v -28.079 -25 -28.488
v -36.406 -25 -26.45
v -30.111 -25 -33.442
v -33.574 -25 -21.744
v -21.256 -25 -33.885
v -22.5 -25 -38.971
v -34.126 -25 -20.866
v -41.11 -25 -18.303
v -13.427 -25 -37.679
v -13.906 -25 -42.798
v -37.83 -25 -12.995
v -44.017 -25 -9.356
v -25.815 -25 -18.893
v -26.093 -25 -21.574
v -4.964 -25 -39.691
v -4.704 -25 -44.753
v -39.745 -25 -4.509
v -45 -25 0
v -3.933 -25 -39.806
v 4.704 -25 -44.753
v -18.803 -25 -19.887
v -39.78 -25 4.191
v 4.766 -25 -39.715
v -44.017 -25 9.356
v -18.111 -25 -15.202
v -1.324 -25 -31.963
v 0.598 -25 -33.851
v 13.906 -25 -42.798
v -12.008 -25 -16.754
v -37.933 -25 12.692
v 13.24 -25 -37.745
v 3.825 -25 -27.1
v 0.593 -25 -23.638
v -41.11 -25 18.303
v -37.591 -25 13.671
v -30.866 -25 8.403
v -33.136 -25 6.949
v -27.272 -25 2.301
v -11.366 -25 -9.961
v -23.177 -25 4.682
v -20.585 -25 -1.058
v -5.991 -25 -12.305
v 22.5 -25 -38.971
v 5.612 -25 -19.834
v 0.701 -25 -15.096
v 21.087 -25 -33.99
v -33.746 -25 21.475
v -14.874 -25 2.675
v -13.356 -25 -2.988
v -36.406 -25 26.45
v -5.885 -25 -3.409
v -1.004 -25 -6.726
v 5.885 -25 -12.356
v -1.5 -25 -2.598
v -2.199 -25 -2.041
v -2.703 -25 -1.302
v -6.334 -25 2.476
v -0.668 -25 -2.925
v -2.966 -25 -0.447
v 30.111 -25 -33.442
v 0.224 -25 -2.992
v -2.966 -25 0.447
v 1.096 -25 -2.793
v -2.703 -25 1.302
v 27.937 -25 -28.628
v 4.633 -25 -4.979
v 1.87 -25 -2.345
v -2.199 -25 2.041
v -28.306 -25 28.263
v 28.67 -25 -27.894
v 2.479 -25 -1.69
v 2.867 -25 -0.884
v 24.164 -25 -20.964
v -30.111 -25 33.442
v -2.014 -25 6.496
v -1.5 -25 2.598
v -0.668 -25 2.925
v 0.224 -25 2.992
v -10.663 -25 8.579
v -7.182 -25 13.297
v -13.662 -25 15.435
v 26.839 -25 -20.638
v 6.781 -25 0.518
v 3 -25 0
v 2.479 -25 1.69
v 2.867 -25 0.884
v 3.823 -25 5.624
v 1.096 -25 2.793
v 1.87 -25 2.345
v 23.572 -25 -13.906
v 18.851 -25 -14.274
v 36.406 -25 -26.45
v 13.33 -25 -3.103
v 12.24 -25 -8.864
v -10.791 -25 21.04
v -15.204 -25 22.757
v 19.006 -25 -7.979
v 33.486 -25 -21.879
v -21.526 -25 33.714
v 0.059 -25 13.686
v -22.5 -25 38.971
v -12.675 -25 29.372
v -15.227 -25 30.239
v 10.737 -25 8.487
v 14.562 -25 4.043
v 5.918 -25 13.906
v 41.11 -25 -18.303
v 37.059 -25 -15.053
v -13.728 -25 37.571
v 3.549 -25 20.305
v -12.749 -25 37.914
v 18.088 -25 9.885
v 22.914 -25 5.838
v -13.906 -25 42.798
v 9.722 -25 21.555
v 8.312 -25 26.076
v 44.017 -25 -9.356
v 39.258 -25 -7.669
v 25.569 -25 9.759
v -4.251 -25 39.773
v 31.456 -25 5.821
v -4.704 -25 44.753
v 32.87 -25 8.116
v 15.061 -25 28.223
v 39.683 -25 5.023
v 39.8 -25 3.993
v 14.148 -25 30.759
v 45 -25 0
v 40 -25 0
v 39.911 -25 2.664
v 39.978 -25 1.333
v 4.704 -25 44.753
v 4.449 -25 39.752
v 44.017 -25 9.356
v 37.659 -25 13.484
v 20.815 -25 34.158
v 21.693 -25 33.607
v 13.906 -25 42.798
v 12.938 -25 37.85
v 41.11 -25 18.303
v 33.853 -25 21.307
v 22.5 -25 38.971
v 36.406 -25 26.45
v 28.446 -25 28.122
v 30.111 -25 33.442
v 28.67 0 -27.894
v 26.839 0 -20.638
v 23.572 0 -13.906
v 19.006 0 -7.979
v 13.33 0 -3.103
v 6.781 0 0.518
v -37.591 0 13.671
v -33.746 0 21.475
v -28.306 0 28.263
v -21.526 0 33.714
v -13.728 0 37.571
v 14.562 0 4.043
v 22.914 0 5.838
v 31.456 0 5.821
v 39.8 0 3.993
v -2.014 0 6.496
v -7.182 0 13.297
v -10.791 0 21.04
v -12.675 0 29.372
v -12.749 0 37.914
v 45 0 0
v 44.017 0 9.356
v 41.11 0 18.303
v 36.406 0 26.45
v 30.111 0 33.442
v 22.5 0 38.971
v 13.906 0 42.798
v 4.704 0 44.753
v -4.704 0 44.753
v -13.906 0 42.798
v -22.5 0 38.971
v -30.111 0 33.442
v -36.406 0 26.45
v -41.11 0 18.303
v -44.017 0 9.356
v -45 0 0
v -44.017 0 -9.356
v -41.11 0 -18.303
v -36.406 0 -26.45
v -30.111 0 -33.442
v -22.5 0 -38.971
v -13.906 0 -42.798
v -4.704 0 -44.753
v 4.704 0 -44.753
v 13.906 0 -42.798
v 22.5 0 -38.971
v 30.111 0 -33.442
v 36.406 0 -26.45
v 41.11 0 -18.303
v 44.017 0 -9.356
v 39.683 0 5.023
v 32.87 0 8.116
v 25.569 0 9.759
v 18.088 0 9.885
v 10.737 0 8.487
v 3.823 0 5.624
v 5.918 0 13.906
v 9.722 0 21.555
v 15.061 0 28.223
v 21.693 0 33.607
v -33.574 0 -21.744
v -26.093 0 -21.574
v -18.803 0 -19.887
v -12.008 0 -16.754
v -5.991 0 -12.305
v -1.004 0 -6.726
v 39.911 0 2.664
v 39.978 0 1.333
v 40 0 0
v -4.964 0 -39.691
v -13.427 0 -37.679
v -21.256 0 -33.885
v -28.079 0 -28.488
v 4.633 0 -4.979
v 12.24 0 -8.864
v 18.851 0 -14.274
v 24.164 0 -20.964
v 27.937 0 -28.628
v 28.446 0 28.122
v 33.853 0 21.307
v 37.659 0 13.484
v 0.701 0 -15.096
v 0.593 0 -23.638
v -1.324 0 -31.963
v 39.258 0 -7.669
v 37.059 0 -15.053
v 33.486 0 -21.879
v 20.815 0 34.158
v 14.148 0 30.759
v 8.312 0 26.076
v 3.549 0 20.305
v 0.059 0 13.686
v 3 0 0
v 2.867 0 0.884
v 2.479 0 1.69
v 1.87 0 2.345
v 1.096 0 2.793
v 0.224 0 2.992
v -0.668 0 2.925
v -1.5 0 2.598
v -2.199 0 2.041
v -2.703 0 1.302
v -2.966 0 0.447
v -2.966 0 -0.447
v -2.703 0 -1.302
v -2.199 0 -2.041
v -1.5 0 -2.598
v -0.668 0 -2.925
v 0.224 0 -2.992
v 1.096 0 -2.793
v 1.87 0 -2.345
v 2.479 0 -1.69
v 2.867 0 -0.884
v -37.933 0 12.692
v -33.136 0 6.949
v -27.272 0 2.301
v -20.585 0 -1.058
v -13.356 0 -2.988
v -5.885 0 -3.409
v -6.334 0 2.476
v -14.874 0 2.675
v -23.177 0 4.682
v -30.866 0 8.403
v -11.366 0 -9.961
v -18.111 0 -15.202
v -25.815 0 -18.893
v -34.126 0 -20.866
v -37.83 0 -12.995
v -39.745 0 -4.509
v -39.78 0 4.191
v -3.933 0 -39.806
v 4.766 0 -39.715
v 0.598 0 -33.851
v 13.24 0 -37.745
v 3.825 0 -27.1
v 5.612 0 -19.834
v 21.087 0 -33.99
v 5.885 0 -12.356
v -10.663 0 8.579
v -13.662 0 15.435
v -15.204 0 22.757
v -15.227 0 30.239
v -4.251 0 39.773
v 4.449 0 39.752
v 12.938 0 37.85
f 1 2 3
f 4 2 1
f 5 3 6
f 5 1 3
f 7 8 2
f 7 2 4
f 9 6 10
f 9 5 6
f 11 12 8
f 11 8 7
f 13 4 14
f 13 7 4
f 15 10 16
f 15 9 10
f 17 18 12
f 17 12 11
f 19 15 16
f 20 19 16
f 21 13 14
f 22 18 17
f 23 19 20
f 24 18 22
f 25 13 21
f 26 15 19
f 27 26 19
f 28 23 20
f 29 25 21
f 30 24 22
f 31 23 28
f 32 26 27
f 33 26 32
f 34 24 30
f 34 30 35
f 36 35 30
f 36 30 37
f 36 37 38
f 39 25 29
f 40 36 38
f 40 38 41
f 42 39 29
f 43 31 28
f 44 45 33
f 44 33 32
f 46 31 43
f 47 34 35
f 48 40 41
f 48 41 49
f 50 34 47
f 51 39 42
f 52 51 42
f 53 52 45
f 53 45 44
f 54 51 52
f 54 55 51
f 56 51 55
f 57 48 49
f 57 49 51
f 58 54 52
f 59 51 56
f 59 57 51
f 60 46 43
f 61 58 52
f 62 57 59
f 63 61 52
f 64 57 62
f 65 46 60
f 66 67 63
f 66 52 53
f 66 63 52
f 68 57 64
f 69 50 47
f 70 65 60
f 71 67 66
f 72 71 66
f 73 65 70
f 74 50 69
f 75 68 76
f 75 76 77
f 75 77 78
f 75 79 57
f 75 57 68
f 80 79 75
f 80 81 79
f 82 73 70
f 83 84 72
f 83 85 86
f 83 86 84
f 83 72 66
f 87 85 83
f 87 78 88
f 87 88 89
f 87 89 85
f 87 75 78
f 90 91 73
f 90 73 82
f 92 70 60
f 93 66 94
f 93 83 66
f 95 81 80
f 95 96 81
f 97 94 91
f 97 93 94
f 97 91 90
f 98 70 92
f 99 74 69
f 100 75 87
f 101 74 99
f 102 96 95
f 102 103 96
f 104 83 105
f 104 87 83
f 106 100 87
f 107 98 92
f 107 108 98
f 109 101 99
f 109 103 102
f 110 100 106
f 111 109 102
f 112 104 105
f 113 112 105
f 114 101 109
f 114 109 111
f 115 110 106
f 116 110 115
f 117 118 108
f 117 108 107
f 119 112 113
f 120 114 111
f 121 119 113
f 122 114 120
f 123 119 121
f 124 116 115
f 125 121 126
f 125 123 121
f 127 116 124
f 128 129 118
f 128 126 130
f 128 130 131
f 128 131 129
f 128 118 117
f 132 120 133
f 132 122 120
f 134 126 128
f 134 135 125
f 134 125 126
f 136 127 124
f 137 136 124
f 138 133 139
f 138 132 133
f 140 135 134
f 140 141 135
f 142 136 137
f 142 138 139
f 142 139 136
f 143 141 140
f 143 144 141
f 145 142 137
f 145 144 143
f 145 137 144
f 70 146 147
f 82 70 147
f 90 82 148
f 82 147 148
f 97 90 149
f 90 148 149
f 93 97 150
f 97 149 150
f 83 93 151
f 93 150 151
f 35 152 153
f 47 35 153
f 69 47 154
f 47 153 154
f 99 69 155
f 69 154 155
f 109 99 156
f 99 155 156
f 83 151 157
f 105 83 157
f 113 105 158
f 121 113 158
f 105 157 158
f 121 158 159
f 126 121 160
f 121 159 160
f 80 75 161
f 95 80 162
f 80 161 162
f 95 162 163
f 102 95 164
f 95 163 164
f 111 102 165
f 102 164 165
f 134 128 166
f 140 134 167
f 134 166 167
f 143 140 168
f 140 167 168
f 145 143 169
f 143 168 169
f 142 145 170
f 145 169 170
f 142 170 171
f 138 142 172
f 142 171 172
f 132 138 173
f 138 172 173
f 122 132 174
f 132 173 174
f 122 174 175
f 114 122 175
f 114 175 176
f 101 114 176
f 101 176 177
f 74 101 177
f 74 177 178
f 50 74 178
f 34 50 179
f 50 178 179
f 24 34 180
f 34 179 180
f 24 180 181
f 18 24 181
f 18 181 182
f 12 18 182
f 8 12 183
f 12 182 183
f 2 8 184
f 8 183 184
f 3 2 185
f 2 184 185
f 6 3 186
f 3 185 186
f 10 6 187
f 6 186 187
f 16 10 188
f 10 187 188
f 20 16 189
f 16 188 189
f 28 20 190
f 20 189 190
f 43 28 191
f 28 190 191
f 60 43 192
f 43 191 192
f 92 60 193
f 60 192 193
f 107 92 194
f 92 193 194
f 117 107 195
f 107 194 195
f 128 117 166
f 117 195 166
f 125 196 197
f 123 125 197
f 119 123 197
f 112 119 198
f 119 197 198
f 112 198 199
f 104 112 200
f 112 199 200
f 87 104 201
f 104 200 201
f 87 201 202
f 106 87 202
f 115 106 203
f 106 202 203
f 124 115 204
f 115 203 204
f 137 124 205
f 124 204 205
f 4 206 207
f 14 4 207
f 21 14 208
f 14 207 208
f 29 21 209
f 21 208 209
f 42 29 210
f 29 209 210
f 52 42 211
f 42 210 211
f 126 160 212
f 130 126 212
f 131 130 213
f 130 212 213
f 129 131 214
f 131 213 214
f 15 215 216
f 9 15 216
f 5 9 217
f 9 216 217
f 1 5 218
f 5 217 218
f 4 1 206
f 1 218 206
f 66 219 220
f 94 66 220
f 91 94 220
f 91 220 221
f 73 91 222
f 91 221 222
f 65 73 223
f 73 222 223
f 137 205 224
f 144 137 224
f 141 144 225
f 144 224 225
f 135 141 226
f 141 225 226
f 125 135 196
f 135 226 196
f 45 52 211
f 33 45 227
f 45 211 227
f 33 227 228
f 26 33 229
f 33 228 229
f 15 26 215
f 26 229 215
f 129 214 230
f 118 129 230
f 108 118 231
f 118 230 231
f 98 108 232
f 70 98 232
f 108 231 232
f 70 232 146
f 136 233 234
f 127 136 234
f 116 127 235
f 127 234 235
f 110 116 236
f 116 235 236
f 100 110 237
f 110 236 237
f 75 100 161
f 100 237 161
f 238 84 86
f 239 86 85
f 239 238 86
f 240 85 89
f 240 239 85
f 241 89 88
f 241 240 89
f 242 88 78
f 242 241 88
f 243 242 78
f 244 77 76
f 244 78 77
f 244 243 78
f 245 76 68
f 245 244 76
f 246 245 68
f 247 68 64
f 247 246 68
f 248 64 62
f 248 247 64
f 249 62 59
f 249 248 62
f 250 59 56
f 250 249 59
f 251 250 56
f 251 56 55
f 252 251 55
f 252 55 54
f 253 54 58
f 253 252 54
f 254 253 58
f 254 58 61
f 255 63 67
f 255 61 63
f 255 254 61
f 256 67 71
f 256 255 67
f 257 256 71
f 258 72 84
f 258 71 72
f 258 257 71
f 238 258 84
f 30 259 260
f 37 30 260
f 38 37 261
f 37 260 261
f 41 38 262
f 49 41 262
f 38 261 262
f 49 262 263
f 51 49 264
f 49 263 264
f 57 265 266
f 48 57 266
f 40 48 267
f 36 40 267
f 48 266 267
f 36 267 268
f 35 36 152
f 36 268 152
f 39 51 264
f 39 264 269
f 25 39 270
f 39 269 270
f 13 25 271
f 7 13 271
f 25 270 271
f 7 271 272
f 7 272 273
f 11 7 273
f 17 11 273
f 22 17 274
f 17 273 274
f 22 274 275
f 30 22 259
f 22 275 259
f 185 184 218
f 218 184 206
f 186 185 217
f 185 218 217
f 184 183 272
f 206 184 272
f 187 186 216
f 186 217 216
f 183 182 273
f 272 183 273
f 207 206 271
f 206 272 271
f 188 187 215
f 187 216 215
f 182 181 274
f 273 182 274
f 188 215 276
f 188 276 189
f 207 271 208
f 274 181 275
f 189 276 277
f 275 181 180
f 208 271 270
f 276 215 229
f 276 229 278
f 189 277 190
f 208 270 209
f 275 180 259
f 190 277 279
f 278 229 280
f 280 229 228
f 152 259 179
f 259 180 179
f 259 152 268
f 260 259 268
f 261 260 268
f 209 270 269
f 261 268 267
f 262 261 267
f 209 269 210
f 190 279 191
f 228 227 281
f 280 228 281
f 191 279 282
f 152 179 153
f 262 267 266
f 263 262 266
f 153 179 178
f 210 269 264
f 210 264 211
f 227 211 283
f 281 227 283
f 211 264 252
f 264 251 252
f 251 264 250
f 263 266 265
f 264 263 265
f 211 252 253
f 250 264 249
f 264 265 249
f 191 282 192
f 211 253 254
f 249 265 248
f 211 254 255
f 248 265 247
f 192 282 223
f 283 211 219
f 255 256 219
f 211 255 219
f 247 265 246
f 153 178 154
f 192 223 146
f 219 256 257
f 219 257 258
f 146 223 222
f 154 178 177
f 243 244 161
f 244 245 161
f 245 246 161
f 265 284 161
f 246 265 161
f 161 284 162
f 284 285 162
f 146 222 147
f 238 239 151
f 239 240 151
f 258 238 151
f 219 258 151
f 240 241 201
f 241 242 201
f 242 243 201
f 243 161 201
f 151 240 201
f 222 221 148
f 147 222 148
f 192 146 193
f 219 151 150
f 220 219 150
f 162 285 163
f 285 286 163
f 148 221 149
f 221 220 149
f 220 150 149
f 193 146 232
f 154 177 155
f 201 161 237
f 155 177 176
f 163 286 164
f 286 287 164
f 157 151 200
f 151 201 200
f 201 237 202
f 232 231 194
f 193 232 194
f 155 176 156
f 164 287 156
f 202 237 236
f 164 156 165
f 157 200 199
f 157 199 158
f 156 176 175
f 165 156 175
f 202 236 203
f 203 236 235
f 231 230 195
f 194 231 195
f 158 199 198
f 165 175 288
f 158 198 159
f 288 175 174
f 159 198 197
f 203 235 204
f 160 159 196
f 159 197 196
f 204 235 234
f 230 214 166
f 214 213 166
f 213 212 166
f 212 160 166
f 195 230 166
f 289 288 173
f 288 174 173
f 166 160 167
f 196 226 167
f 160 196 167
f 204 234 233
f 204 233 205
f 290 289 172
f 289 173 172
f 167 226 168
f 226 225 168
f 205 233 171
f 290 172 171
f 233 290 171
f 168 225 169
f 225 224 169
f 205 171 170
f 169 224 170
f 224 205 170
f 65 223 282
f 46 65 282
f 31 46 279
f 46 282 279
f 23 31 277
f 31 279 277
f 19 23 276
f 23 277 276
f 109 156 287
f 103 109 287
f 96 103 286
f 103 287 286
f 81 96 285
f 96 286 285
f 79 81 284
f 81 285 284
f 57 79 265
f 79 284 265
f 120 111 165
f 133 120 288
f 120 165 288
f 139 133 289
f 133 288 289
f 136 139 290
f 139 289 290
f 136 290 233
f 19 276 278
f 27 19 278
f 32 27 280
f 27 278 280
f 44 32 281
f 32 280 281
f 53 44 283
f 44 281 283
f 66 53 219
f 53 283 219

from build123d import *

# Parameters (mm, degrees)
F0_R     = 45
F0_R_2   = 3
F1_DEPTH = 25
F2_COUNT = 7


# Not quite as in the source:
# - a feature names something its author has since deleted; it is built from what else it names


with BuildPart() as f1:
    # F0 (on Front) → F1 (new body)
    with BuildSketch(Plane.XZ):
        Circle(F0_R)
        with BuildLine():
            ThreePointArc((40, 0), (-34.8753984239, -19.58842987), (20.8146707615, 34.1577148107))
            ThreePointArc((20.8146707615, 34.1577148107), (21.2557560399, 33.8849942478), (21.693268588, 33.6065781949))
            ThreePointArc((21.693268588, 33.6065781949), (35.126419854, 19.1346447116), (40, 0))
        make_face(mode=Mode.SUBTRACT)
        with BuildLine():
            ThreePointArc((20.8146707615, 34.1577148107), (4.7404997755, 21.9880977011), (-2.457993575, 3.1556722874))
            ThreePointArc((-2.457993575, 3.1556722874), (-0.7771850997, -3.9237715684), (3.4753115022, 1.9804570085))
            ThreePointArc((3.4753115022, 1.9804570085), (8.7719800119, 19.9895662469), (21.693268588, 33.6065781949))
            ThreePointArc((21.693268588, 33.6065781949), (21.2557560399, 33.8849942478), (20.8146707615, 34.1577148107))
        make_face()
        Circle(F0_R_2, mode=Mode.SUBTRACT)
    extrude(amount=F1_DEPTH)

    # F2: F1 ×7 about axis
    f2_axis = Axis((0, -25, 0), (0, -1, 0))


with BuildPart() as f1_1:
    add(f1.part)
    for i in range(1, F2_COUNT):
        add(f1.part.rotate(f2_axis, i * 360 / F2_COUNT))


solid = f1_1.part
